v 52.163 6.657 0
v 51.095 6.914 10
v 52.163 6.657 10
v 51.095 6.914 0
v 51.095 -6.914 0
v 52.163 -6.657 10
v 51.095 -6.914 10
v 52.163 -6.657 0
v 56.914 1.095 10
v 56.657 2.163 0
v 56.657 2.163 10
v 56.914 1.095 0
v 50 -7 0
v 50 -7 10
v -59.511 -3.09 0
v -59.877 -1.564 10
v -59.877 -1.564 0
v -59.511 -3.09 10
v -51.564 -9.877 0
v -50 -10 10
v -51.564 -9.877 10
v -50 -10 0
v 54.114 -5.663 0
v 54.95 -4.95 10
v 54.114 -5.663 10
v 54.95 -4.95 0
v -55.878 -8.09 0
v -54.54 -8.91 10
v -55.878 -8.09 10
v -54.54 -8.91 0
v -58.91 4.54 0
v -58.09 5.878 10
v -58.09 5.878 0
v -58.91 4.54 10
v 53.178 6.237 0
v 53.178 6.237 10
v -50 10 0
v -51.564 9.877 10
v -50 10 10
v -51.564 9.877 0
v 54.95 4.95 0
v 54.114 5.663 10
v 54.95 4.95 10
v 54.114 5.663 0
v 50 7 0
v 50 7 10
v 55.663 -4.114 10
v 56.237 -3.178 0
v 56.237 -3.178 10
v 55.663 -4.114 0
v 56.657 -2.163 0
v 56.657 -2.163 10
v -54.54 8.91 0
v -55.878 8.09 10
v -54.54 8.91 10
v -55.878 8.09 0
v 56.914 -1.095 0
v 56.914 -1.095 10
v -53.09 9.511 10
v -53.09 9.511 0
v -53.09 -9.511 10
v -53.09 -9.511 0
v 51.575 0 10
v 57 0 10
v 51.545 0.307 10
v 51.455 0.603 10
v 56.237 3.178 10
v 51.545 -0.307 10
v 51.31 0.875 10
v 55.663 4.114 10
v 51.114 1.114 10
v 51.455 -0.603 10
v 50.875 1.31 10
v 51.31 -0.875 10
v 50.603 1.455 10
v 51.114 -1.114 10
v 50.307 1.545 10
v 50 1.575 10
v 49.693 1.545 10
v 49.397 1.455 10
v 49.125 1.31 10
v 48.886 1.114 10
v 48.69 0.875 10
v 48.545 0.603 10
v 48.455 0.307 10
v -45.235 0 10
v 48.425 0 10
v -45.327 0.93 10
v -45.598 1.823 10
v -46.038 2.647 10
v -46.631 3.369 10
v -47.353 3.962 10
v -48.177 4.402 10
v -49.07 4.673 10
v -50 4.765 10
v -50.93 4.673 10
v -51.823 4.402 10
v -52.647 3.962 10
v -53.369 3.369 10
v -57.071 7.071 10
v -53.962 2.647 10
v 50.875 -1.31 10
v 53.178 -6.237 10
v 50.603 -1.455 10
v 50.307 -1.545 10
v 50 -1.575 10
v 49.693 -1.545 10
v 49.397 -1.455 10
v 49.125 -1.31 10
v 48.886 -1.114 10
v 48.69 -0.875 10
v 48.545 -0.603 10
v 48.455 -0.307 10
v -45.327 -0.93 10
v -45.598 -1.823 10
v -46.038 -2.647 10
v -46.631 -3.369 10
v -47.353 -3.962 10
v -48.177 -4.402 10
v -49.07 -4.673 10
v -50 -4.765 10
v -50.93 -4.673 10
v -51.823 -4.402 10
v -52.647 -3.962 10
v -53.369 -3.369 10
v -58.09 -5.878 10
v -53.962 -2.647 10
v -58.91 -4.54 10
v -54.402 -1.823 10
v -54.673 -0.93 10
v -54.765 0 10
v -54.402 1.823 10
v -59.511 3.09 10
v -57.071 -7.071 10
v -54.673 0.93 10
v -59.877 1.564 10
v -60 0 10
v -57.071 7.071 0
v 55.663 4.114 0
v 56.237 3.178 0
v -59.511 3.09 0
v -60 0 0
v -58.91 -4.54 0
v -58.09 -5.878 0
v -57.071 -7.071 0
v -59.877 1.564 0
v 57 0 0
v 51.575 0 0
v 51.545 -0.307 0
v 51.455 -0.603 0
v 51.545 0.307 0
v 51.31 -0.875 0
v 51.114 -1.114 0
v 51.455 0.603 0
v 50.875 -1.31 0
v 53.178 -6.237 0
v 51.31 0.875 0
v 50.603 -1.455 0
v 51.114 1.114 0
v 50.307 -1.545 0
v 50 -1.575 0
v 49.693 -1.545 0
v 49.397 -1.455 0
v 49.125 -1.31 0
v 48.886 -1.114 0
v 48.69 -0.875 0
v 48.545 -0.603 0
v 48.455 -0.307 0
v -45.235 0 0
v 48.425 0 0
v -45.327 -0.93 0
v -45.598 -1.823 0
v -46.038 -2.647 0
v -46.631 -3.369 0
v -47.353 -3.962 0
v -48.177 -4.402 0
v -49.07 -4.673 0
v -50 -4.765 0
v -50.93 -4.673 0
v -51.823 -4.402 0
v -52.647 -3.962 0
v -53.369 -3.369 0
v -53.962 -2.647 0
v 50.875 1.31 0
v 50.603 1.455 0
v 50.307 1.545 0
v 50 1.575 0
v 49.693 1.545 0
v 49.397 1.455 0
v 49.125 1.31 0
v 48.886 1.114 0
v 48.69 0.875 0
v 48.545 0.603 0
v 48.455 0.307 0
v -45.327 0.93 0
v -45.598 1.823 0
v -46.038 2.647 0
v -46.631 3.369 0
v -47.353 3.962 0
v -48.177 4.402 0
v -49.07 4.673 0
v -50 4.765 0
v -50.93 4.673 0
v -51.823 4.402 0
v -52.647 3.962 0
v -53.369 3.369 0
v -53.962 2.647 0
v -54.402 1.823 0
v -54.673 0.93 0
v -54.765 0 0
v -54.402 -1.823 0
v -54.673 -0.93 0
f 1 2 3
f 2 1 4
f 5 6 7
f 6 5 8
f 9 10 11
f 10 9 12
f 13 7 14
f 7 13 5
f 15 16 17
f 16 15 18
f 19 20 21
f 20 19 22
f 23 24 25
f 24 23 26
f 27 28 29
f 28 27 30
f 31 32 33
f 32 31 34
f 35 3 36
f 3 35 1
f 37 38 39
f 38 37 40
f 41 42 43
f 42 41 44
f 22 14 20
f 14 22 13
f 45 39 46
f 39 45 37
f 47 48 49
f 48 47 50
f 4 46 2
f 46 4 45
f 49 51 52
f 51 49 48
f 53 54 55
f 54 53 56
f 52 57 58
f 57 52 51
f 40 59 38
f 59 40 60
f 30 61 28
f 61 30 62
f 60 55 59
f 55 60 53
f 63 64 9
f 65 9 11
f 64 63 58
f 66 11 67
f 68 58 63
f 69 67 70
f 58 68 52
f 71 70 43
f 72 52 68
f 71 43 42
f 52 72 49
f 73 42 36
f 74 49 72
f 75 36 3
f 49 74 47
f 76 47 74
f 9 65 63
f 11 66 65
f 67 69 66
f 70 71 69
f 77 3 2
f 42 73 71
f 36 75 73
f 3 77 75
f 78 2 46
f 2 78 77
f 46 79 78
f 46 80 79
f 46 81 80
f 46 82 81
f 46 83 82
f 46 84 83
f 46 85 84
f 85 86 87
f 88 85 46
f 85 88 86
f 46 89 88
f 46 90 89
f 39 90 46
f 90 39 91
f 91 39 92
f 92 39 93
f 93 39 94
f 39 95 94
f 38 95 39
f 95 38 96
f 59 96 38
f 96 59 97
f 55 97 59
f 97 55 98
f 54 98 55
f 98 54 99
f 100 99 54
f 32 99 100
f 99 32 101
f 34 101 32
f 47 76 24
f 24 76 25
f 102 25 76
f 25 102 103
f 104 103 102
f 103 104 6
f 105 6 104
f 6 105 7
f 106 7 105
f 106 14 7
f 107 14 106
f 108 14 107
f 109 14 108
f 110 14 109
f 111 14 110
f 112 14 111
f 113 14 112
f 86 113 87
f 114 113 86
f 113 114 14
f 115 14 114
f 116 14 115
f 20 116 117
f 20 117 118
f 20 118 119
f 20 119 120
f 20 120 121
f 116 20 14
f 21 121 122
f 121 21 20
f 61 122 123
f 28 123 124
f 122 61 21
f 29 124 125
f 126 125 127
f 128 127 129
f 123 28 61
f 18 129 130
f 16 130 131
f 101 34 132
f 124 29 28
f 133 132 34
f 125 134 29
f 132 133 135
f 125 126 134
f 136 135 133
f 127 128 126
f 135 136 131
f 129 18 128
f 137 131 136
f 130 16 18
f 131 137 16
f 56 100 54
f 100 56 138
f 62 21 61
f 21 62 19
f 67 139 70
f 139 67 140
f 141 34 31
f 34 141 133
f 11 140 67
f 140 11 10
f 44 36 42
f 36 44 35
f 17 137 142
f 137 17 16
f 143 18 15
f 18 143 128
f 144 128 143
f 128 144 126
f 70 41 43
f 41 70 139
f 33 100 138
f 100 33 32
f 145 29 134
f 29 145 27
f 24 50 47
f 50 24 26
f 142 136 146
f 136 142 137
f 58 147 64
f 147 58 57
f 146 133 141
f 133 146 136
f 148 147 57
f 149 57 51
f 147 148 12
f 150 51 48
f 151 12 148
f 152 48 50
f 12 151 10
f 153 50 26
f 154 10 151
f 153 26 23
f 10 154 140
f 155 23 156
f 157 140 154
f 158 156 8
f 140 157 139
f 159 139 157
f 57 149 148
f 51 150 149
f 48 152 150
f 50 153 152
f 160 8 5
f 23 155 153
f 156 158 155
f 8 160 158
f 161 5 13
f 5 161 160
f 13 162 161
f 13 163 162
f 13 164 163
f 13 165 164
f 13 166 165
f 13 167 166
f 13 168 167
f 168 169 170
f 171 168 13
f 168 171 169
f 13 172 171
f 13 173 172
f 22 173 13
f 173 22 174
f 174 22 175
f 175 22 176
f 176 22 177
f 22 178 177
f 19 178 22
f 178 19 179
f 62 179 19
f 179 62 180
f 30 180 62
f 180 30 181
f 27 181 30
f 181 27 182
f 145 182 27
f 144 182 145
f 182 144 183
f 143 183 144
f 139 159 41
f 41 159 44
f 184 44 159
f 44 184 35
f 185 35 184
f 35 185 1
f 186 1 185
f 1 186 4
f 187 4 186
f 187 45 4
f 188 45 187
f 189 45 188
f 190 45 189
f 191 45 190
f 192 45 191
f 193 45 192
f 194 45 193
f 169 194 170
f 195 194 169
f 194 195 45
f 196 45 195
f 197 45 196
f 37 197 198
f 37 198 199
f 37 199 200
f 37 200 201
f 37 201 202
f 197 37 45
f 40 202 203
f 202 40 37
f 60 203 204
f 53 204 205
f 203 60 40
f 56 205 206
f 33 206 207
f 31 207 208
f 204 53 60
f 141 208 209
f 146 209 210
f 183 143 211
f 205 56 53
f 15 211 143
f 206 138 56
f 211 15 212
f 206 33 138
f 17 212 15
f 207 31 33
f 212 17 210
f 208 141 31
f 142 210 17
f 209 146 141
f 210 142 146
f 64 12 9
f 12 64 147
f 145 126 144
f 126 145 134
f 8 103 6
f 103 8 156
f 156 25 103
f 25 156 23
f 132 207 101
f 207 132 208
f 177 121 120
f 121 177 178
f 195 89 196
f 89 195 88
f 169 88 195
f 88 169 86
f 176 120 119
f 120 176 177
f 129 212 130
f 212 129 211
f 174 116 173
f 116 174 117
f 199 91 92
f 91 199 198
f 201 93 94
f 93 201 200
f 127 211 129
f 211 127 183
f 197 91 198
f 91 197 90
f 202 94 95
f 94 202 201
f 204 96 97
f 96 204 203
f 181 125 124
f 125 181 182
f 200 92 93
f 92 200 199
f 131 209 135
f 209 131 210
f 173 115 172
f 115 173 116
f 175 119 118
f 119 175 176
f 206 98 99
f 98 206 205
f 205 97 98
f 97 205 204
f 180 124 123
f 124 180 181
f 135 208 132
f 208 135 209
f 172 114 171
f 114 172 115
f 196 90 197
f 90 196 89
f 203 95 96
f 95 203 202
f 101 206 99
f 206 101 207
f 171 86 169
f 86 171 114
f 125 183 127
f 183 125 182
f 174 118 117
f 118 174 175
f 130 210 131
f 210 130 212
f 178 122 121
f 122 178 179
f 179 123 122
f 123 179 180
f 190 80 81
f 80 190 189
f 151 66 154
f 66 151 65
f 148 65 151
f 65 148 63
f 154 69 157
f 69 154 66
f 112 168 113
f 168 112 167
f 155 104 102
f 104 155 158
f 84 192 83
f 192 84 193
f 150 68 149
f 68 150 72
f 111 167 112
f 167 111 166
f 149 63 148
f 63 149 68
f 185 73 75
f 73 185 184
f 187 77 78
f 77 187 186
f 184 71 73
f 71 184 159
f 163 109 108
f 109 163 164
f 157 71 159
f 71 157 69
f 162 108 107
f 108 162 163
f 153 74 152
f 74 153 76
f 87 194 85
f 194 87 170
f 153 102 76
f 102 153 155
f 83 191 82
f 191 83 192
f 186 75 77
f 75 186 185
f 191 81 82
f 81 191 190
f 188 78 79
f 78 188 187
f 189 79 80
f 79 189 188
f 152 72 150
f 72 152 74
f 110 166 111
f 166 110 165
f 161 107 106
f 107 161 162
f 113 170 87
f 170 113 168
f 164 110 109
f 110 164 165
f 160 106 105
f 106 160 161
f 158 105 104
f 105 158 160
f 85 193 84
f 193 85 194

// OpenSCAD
$fn = 32;

// ----------------------------------------------------------------------
// Lever: 100 mm between the bosses, 10 mm thick, smooth outline
// ----------------------------------------------------------------------

// --- parameters (mm) ---
lever_l = 100;            // distance between the boss centres
boss_a = 20;              // first boss diameter
boss_b = 14;              // second boss diameter
bore_a = 9.53;            // first bore
bore_b = 3.15;            // second bore
lever_t = 10;             // lever thickness

lever_profile = [[-60, 0], [-59.877, -1.564], [-59.511, -3.09], [-58.91, -4.54], [-58.09, -5.878], [-57.071, -7.071], [-55.878, -8.09], [-54.54, -8.91], [-53.09, -9.511], [-51.564, -9.877], [-50, -10], [50, -7], [51.095, -6.914], [52.163, -6.657], [53.178, -6.237], [54.114, -5.663], [54.95, -4.95], [55.663, -4.114], [56.237, -3.178], [56.657, -2.163], [56.914, -1.095], [57, 0], [56.914, 1.095], [56.657, 2.163], [56.237, 3.178], [55.663, 4.114], [54.95, 4.95], [54.114, 5.663], [53.178, 6.237], [52.163, 6.657], [51.095, 6.914], [50, 7], [-50, 10], [-51.564, 9.877], [-53.09, 9.511], [-54.54, 8.91], [-55.878, 8.09], [-57.071, 7.071], [-58.09, 5.878], [-58.91, 4.54], [-59.511, 3.09], [-59.877, 1.564]];

difference() {
  linear_extrude(height = lever_t) polygon(lever_profile);
  translate([-50, 0, -2.5]) cylinder(h = lever_t + 5, d = bore_a);
  translate([50, 0, -2.5]) cylinder(h = lever_t + 5, d = bore_b);
}
